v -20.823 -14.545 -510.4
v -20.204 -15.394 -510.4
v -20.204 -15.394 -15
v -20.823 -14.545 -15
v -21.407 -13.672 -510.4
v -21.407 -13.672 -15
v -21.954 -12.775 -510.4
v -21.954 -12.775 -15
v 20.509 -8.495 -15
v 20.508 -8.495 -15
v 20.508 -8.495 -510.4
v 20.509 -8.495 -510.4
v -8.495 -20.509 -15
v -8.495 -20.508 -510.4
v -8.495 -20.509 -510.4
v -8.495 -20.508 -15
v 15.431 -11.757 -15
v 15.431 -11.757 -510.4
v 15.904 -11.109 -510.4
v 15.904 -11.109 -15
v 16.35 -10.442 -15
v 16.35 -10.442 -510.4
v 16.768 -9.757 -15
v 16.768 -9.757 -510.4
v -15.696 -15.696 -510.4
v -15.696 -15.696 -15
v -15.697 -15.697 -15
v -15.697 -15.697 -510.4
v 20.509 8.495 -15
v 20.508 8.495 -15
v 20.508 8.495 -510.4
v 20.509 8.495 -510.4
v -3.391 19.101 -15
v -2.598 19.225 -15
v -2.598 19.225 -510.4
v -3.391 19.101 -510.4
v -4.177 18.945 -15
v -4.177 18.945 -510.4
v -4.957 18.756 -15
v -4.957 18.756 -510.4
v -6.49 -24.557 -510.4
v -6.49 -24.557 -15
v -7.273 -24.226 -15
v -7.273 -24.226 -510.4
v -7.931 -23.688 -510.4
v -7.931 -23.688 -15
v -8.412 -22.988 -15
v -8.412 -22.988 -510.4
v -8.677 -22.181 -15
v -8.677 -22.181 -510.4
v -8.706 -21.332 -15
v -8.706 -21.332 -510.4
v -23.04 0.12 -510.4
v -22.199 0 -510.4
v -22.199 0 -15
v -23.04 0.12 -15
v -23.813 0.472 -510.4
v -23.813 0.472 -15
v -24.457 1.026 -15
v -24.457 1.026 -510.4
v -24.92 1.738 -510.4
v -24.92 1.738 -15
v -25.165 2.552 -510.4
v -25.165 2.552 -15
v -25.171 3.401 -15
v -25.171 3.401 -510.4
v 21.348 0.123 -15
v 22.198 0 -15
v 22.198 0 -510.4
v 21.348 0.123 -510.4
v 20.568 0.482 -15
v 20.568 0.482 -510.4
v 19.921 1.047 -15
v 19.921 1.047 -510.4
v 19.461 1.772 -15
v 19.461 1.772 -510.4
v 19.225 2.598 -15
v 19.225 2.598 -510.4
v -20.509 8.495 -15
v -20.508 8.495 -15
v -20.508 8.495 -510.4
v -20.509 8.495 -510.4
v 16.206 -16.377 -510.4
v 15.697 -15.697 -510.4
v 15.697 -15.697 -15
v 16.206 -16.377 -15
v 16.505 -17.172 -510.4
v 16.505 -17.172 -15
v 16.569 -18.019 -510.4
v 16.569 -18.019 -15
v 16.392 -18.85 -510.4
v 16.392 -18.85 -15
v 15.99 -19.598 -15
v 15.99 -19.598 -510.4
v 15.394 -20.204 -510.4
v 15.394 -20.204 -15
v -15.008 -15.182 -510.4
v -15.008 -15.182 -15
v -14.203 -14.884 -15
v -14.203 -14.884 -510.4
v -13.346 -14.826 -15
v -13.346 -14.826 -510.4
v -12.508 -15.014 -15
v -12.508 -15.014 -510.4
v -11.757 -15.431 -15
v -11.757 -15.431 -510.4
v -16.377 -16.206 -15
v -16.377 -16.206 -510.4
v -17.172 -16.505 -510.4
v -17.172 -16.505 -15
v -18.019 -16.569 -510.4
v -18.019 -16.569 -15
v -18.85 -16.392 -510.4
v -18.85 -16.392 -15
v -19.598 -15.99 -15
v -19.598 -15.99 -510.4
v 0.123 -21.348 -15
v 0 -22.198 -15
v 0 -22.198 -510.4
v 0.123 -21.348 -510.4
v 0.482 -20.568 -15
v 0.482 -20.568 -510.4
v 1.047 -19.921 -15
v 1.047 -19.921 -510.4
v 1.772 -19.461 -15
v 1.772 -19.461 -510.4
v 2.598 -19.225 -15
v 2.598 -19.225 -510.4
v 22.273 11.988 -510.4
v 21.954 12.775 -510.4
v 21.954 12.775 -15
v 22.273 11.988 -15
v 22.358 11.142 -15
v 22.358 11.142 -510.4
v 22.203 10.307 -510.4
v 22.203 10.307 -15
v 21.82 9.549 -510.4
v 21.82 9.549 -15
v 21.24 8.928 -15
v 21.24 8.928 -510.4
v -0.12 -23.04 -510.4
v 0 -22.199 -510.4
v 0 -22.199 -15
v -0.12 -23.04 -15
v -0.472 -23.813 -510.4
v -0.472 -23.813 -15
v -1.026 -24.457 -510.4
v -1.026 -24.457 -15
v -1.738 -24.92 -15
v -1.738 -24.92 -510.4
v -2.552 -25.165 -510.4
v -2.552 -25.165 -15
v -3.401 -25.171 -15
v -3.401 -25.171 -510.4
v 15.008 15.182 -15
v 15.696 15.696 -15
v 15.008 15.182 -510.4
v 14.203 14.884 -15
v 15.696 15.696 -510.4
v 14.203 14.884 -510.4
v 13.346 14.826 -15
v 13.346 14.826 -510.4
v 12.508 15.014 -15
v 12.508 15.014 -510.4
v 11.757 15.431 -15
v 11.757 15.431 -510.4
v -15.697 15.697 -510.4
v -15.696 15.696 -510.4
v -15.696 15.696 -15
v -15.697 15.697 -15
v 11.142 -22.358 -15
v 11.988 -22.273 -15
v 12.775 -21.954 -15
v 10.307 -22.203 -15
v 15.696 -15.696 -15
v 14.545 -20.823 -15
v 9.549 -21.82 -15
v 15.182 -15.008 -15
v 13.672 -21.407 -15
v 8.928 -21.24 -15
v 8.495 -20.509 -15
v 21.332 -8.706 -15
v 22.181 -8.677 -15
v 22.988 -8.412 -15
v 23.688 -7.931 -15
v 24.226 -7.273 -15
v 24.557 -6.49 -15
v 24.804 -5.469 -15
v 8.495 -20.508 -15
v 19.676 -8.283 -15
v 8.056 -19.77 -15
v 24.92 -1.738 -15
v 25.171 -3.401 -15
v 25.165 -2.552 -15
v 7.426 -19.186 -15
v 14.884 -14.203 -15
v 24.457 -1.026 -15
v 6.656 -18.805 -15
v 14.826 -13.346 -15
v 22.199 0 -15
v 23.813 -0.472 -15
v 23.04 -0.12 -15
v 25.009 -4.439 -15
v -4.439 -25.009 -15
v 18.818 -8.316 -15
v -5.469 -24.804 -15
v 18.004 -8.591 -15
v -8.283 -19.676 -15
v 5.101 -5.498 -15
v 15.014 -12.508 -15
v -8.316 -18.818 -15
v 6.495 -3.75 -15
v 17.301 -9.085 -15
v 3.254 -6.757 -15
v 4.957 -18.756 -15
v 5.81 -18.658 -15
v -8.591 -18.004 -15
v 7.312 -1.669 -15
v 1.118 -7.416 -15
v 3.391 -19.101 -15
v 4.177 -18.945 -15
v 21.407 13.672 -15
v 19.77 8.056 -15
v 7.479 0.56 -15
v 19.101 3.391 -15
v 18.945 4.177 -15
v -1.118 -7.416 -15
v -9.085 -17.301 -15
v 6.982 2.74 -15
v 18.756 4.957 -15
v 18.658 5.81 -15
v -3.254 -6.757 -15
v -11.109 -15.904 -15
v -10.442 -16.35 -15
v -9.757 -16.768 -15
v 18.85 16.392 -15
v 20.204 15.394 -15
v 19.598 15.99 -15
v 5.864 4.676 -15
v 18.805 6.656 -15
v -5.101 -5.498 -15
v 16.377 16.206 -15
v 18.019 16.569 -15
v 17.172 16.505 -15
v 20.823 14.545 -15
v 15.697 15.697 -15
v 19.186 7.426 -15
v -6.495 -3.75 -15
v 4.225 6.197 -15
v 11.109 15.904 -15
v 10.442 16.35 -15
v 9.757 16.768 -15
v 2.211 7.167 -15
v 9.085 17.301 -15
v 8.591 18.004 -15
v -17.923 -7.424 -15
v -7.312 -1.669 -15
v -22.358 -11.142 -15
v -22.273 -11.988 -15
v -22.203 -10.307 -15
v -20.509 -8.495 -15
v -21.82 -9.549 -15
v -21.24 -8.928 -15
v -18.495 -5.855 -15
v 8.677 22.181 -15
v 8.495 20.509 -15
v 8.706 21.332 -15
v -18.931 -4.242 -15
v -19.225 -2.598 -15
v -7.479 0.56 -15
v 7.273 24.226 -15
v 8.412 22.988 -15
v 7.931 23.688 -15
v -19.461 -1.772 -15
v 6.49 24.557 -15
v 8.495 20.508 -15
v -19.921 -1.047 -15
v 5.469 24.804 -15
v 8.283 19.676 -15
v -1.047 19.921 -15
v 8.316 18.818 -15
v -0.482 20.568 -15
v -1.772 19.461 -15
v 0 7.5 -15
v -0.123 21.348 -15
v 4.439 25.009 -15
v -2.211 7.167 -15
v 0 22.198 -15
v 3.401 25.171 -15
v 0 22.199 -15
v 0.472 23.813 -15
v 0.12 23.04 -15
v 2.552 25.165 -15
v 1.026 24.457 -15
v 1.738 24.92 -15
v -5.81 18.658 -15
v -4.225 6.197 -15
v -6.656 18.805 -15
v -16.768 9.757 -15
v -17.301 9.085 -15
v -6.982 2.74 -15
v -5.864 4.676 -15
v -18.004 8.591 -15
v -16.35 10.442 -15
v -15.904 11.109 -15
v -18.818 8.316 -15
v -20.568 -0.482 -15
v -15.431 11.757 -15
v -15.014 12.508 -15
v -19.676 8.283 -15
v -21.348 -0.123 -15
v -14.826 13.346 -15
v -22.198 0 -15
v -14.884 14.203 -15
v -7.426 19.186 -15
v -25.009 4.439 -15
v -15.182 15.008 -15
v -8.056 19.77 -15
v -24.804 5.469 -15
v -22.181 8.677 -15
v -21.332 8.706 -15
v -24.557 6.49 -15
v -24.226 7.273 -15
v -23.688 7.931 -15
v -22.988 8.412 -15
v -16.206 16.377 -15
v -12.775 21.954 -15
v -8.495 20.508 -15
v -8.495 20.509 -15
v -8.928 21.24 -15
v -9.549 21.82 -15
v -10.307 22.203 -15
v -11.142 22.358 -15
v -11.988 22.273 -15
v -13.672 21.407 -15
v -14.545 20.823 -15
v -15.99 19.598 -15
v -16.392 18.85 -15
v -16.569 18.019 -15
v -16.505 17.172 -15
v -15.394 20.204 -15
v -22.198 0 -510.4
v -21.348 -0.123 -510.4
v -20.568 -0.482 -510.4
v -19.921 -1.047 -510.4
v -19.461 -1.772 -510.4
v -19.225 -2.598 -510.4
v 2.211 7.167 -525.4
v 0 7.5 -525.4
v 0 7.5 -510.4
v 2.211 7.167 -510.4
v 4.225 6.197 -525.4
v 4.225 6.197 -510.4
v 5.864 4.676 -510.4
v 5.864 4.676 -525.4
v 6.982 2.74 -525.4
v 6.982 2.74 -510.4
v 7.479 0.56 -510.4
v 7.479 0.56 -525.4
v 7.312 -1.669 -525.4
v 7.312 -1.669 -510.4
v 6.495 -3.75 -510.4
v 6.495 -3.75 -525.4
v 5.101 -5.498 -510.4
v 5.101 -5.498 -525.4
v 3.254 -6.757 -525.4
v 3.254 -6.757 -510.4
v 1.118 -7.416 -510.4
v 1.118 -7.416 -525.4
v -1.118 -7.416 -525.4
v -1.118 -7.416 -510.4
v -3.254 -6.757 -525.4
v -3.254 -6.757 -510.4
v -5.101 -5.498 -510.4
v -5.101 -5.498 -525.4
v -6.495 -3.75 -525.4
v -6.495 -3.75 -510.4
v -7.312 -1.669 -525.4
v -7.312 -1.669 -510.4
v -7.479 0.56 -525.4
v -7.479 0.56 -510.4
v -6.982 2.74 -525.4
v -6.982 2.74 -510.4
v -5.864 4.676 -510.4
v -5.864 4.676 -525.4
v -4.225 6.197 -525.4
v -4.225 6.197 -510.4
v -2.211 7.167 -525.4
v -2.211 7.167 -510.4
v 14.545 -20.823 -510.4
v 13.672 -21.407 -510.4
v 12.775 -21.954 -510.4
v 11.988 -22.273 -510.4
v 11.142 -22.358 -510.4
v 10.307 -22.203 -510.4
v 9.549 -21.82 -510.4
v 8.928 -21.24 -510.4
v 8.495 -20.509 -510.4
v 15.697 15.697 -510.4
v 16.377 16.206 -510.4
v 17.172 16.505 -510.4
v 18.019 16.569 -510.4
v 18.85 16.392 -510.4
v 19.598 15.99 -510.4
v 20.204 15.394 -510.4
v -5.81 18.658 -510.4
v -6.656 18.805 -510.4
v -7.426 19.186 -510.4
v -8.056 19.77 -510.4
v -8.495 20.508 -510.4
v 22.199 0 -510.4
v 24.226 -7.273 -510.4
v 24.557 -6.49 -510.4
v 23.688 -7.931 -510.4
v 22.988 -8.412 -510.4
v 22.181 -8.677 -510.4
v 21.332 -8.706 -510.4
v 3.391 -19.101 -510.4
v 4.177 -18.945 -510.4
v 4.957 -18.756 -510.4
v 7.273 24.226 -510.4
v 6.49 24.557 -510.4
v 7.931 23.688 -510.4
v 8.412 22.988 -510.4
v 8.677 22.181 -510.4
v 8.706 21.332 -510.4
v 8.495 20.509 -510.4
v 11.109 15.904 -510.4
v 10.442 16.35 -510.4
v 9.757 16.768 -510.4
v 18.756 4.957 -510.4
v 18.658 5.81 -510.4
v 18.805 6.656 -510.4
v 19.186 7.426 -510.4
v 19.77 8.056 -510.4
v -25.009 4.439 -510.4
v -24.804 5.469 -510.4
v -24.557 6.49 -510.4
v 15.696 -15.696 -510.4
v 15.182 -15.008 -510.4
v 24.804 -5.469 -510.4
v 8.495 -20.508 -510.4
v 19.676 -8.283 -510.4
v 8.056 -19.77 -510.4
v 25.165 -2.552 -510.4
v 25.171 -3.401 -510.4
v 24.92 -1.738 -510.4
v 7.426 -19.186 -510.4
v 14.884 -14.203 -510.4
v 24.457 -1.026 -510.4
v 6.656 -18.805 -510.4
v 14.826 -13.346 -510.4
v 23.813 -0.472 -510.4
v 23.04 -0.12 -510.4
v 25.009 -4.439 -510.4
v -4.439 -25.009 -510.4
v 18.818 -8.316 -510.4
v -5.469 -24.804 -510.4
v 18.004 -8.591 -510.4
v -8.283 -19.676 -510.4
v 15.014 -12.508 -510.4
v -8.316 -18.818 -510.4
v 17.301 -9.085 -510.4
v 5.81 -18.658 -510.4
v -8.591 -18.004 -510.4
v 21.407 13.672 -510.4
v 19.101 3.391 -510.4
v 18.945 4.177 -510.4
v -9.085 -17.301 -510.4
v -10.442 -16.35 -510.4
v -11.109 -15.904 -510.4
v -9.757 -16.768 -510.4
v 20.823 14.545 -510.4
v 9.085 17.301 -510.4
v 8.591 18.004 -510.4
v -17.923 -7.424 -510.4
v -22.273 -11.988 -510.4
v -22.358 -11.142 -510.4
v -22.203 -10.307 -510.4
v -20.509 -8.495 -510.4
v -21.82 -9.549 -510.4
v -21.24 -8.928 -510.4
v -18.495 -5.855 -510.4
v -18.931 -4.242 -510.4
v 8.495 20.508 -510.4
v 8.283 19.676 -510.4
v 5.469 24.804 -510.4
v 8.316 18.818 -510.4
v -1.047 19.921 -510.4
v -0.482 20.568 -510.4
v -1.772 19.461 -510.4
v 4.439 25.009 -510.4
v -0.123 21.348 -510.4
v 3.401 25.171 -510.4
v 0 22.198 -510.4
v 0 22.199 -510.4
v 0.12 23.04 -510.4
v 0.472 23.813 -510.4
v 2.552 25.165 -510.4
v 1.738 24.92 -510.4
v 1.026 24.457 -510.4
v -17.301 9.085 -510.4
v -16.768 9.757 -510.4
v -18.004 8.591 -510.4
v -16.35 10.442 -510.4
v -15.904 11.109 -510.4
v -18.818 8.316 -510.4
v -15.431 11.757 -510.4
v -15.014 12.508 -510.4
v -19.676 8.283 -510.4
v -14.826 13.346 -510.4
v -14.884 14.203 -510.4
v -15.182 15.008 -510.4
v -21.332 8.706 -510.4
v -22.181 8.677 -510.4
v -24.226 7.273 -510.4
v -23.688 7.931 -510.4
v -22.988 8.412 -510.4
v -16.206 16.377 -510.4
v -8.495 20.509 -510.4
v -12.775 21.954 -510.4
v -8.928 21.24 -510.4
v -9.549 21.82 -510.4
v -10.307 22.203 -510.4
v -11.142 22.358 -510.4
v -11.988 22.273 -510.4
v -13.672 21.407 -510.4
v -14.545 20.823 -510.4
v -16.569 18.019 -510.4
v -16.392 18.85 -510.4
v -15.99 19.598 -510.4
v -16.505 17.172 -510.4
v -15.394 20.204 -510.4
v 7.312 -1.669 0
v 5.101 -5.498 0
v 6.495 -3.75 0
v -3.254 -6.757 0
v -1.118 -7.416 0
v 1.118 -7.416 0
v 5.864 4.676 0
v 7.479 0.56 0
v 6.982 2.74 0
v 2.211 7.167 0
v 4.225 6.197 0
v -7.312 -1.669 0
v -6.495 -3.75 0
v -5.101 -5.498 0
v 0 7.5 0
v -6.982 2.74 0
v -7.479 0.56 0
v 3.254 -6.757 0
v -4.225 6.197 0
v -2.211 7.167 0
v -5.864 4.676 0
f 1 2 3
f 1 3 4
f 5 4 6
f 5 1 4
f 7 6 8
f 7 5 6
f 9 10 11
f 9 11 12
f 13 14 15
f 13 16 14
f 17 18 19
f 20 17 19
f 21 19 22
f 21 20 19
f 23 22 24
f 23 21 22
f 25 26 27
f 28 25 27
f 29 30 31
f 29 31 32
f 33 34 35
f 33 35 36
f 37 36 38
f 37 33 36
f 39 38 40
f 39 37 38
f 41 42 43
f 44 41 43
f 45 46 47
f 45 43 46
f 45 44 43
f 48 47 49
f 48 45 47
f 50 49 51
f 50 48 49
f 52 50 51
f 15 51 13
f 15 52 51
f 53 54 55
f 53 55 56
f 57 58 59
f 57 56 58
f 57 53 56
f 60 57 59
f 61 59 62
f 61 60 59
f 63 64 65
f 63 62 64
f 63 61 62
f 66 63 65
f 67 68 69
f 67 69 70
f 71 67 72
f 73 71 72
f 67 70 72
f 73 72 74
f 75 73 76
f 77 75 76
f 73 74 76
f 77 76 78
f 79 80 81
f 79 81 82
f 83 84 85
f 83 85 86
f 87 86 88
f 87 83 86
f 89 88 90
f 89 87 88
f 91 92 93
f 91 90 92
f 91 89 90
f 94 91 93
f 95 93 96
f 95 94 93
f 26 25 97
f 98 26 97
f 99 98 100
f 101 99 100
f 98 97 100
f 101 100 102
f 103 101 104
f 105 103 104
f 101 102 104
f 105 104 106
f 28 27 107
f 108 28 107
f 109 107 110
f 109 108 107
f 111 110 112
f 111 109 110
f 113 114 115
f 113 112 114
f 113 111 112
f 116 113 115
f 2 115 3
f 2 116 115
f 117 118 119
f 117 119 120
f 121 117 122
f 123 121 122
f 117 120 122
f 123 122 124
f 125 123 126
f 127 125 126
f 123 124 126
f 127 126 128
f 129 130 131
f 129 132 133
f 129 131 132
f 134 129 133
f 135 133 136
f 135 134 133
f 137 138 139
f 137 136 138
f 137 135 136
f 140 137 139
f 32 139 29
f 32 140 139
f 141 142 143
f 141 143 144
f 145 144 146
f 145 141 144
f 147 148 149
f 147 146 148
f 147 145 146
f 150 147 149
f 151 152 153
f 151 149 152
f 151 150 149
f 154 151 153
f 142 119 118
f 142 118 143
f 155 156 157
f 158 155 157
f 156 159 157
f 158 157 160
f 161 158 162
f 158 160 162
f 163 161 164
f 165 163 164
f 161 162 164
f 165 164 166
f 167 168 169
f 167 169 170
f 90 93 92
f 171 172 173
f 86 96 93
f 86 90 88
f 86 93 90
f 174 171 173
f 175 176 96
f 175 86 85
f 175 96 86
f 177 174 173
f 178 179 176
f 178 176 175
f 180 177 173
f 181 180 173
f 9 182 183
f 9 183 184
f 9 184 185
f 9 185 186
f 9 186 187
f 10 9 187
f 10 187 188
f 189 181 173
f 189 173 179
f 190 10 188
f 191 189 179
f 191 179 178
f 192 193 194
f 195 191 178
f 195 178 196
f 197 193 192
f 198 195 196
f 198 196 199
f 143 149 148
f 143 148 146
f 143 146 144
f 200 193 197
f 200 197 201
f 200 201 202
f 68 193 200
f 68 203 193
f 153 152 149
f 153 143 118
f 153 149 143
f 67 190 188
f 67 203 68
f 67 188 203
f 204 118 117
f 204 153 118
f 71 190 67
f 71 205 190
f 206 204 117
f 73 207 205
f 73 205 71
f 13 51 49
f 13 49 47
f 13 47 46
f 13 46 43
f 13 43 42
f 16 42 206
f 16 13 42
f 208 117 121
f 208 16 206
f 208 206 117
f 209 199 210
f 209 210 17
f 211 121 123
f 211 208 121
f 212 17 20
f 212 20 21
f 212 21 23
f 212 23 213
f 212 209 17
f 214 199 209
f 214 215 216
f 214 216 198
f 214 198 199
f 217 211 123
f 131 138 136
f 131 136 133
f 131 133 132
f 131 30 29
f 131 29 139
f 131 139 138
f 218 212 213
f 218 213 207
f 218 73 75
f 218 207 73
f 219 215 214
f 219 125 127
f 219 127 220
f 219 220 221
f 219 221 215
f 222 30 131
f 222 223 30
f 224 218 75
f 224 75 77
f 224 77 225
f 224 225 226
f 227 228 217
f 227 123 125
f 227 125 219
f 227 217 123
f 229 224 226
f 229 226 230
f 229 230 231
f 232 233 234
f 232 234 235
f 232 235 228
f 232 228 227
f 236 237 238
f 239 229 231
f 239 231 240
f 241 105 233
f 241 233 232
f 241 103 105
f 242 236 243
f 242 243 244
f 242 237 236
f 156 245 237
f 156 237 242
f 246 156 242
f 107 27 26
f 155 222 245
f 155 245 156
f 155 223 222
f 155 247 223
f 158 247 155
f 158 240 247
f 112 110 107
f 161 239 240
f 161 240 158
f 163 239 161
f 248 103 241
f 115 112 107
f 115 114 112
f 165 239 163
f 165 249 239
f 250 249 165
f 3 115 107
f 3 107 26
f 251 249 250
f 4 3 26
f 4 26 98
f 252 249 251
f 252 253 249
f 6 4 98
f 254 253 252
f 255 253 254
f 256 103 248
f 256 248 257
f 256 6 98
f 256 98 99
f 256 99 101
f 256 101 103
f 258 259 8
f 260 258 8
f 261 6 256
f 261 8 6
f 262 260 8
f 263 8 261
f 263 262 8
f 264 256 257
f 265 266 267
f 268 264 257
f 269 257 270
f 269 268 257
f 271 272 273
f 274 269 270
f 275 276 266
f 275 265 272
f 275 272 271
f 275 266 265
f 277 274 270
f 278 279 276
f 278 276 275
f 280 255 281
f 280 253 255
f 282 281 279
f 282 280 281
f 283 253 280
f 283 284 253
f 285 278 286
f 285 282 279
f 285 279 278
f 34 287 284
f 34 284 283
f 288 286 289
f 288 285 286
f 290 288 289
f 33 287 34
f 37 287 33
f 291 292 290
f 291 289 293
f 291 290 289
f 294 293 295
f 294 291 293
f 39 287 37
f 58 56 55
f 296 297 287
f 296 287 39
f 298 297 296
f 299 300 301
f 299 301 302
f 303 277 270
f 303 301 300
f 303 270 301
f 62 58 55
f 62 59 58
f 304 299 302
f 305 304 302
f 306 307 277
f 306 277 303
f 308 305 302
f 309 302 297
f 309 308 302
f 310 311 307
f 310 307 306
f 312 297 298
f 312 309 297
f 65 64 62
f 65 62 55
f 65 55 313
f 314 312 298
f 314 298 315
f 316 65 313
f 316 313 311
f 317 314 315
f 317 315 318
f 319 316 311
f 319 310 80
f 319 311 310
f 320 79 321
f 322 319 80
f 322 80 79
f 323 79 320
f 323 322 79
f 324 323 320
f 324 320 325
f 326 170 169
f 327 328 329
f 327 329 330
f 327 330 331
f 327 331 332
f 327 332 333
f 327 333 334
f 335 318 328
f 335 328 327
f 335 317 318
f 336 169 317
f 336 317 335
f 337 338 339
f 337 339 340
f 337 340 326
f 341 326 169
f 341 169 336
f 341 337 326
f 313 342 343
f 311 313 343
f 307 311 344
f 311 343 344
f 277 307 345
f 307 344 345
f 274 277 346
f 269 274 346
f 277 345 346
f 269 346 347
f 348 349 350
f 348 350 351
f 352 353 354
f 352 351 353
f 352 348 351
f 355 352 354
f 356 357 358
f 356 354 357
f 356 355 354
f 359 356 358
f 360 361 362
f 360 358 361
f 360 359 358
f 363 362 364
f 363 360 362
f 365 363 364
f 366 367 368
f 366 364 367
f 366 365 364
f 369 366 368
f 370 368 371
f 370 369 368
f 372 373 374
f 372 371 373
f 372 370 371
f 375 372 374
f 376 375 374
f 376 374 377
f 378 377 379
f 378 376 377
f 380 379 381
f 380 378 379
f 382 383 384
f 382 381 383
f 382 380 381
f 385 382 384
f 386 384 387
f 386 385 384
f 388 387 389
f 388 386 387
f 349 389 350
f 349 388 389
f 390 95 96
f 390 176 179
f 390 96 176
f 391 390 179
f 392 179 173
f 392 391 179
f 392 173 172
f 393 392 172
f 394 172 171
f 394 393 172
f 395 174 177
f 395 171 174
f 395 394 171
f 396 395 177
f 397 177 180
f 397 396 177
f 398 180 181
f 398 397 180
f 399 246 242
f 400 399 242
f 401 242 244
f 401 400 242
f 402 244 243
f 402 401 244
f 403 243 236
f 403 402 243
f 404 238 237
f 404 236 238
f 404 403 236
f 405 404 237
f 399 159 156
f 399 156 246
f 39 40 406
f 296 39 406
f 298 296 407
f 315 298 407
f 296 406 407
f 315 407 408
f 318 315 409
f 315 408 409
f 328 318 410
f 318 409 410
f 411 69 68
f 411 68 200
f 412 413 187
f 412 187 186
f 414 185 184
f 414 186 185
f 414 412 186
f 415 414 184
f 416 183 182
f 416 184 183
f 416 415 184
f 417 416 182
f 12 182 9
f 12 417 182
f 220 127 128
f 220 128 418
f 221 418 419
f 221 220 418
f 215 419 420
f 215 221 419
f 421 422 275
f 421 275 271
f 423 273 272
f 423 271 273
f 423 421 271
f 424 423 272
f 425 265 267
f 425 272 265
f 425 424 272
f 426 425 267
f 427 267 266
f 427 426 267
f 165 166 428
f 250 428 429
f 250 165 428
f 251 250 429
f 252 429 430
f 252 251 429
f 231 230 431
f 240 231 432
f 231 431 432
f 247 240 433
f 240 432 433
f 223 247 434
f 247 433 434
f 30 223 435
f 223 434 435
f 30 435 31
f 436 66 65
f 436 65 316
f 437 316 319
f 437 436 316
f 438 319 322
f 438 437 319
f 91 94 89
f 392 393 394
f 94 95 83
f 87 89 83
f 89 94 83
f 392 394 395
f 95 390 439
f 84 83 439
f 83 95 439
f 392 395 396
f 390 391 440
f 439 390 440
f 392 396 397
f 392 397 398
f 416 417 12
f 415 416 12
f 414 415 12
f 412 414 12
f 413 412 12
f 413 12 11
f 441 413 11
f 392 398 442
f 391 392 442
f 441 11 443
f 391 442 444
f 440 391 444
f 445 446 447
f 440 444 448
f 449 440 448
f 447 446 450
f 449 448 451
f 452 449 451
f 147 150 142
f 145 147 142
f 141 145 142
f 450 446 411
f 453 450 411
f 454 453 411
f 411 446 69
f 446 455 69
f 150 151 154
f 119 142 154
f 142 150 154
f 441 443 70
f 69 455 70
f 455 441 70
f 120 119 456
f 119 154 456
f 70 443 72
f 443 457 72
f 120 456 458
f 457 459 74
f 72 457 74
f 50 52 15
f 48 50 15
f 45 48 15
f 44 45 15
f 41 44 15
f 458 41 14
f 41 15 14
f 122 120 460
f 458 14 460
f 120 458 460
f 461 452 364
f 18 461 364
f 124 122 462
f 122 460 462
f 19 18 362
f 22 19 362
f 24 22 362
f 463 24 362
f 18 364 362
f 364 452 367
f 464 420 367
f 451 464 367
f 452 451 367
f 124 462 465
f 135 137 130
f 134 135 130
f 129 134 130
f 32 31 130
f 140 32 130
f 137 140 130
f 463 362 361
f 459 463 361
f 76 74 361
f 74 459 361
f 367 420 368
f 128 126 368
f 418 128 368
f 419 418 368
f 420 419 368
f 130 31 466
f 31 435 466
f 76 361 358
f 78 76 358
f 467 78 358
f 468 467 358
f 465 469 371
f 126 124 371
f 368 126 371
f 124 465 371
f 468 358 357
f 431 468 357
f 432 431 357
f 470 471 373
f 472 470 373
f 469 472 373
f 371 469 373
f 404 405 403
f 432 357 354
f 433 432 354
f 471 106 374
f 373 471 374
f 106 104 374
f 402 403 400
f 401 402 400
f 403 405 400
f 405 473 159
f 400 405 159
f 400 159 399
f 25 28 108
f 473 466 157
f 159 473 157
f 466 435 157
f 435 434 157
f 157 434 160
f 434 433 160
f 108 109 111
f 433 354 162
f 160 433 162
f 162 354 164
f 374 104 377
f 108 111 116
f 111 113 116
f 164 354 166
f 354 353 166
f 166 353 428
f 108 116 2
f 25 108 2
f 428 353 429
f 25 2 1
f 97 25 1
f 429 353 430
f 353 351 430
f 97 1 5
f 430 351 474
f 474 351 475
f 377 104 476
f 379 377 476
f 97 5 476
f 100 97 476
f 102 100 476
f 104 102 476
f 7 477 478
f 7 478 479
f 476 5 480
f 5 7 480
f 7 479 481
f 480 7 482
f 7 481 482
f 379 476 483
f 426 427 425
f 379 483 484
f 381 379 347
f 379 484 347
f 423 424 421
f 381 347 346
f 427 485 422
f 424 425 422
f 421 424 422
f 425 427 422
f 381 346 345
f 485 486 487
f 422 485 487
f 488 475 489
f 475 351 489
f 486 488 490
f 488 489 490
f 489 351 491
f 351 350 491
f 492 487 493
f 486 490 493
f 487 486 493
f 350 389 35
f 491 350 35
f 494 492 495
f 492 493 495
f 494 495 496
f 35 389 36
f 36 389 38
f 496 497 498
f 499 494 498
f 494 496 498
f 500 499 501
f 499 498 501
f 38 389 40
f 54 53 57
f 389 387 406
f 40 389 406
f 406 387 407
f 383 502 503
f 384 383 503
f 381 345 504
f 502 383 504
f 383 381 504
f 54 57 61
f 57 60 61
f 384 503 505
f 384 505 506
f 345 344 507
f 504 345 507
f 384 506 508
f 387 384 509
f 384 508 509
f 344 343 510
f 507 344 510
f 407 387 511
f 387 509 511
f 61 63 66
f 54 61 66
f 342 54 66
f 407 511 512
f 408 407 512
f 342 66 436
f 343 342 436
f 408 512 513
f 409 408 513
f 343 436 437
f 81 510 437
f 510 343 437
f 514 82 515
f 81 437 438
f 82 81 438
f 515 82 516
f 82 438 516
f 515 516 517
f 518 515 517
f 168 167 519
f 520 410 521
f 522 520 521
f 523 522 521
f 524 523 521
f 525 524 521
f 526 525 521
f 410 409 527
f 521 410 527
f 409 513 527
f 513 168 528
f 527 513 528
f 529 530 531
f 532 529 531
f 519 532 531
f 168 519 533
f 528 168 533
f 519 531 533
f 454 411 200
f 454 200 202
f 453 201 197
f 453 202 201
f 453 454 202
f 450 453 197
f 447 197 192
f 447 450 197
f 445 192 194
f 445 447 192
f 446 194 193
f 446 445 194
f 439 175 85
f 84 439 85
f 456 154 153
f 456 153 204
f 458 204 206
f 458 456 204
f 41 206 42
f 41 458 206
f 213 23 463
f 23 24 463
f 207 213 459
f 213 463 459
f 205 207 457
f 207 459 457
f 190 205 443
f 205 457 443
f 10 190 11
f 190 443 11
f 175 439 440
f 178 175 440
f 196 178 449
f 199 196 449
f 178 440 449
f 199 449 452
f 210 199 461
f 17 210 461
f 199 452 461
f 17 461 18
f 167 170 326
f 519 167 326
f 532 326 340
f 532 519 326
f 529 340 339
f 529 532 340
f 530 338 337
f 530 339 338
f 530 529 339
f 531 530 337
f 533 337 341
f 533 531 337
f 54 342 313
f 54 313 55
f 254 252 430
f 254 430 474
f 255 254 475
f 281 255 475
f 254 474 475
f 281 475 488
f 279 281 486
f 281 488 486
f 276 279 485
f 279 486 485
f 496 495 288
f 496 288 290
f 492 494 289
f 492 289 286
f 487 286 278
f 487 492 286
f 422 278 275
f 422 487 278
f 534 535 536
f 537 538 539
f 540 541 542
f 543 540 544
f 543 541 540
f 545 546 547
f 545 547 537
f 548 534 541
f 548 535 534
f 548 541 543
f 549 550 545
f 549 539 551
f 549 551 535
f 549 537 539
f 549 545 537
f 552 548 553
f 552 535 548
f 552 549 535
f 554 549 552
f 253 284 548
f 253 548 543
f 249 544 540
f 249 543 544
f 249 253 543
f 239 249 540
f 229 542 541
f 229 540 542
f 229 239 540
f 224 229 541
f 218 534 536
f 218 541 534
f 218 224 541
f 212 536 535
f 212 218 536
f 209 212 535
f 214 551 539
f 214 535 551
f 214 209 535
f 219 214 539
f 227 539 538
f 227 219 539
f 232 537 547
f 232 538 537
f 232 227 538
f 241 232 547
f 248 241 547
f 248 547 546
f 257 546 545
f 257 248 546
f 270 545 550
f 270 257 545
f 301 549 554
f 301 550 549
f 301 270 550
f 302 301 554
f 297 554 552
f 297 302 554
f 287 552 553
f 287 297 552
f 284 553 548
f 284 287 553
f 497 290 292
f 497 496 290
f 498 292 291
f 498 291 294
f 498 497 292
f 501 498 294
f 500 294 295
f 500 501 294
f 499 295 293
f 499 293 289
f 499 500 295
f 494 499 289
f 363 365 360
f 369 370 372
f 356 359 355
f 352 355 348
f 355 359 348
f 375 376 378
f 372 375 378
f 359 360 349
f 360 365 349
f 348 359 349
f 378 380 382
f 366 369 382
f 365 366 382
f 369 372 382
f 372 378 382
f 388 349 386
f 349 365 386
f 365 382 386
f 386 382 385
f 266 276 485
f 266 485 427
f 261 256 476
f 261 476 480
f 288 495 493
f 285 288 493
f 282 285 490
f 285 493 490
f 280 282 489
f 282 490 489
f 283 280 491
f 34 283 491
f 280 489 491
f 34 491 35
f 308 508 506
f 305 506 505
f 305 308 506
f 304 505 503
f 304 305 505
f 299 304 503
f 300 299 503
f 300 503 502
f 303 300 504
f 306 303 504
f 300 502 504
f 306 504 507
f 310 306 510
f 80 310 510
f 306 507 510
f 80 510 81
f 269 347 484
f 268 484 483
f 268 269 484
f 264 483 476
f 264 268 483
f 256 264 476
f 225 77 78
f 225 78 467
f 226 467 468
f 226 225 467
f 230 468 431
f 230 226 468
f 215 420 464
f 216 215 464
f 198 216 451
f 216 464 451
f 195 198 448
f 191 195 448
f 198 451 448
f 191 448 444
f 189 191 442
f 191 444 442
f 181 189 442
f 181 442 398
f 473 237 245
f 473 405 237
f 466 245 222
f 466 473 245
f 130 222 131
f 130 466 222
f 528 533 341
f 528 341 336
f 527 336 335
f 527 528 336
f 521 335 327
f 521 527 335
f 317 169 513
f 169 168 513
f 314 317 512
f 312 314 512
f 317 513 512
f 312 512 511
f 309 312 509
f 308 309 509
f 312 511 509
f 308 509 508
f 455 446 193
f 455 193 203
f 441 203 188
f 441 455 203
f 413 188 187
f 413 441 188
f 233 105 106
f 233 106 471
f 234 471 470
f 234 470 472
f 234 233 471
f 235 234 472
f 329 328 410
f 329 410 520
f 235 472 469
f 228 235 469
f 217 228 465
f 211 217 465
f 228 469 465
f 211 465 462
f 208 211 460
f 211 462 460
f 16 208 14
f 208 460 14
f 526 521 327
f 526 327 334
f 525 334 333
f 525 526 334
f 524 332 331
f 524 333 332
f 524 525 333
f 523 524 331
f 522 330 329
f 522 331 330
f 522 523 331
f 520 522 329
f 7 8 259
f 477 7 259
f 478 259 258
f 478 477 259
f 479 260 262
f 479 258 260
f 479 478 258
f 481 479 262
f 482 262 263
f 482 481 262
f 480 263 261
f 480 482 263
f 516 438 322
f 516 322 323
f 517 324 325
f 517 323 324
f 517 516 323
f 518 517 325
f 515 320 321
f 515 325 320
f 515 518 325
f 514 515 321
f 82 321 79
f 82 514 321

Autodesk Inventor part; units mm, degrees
ref_plane "YZ Plane" through (0, 0, 0) normal (1, 0, 0) x (0, 1, 0)
ref_plane "XZ Plane" through (0, 0, 0) normal (0, 1, 0) x (-1, 0, 0)
ref_plane "XY Plane" through (0, 0, 0) normal (0, 0, 1) x (1, 0, 0)
sketch "Esboço1" plane through (0, 0, 0) normal (1, 0, 0) x (0, 1, 0)
  line L0 (0, 0) -> (0, -525.4)
  line L1 (0, 0) -> (7.5, 0)
  line L2 (7.5, 0) -> (7.5, -525.4)
  line L3 (7.5, -525.4) -> (0, -525.4)
  line L4 (0, -525.4) -> (0, 0)
  line L5 (7.5, -15) -> (25.4, -15)
  line L6 (25.4, -15) -> (25.4, -510.4)
  line L7 (25.4, -510.4) -> (7.5, -510.4)
  line L8 (7.5, -510.4) -> (7.5, -15)
  point P0 (3.75, 0)
  point P1 (3.75, -525.4)
  point P2 (7.5, -510.4)
  dimension "d0" = 525.4
  dimension "d1" = 7.5
  dimension "d2" = 25.4
  dimension "d3" = 15
  dimension "d4" = 15
revolve "Revolução1" add sketch "Esboço1" angle 360 about axis through (0, 0, -525.4) along (0, 0, 1)
thread "Rosca1" size "M1060x8" class "6g" standard "ANSI Metric M Profile" length 495.4
sketch "Esboço2" plane through (0, 0, -15) normal (0, 0, 1) x (1, 0, 0)
  circle A0 centre (0, 0) radius 7.5 projected
  circle A1 centre (0, 0) radius 25.4 projected
  circle A2 centre (0, 0) radius 7.5 projected
  line L0 (0, 0) -> (0, 25.4)
  line L1 (0, 0) -> (-25.4, 0)
  line L2 (0, 0) -> (0, -25.4)
  line L3 (0, 0) -> (25.4, 0)
  line L4 (0, 0) -> (17.9605, 17.9605)
  line L5 (0, 0) -> (9.7202, 23.4665)
  line L6 (0, 0) -> (23.4665, 9.7202)
  line L7 (0, 0) -> (-17.9605, 17.9605)
  line L8 (0, 0) -> (-9.7202, 23.4665)
  line L9 (0, 0) -> (-23.4665, 9.7202)
  line L10 (0, 0) -> (17.9605, -17.9605)
  line L11 (0, 0) -> (9.7202, -23.4665)
  line L12 (0, 0) -> (23.4665, -9.7202)
  line L13 (0, 0) -> (-9.7202, -23.4665)
  line L14 (0, 0) -> (-17.9605, -17.9605)
  line L15 (0, 0) -> (-23.4665, -9.7202)
  circle A3 centre (0, 0) radius 19.4
  point P0 (-17.9233, 7.4241)
  point P1 (-13.7179, 13.7179)
  point P2 (-17.9233, -7.4241)
  point P3 (-19.4, 0)
  point P4 (-7.4241, -17.9233)
  point P5 (-13.7179, -13.7179)
  point P6 (7.4241, -17.9233)
  point P7 (0, -19.4)
  point P8 (17.9233, -7.4241)
  point P9 (13.7179, -13.7179)
  point P10 (17.9233, 7.4241)
  point P11 (19.4, 0)
  point P12 (7.4241, 17.9233)
  point P13 (13.7179, 13.7179)
  point P14 (-7.4241, 17.9233)
  point P15 (0, 19.4)
  dimension "d8" = 22.5
  dimension "d9" = 22.5
  dimension "d10" = 45
  dimension "d11" = 6
extrude "Extrusão1" cut sketch "Esboço2" against normal up to surface (495.4 mm away) contours A3 L6 A1 L3 | L12 A1 L10 A3 | A3 L5 A1 L4 | A3 L8 A1 L0 | A3 L15 A1 L1 | A3 L11 A1 L2 | A3 L9 A1 L7 | L13 A1 L14 A3
fillet "Arredondamento1" radius 3 31 edges at (7.4241, 17.9233, -262.7) (13.7179, 13.7179, -262.7) (17.9605, 17.9605, -262.7) (9.7202, 23.4665, -262.7) (0, 25.4, -262.7) (0, 19.4, -262.7) (-9.7202, 23.4665, -262.7) (-7.4241, 17.9233, -262.7) (-23.4665, 9.7202, -262.7) (-17.9605, 17.9605, -262.7) (-17.9233, 7.4241, -262.7) (-13.7179, 13.7179, -262.7) (19.4, 0, -262.7) (17.9233, 7.4241, -262.7) (23.4665, 9.7202, -262.7) (25.4, 0, -262.7) (23.4665, -9.7202, -262.7) (17.9233, -7.4241, -262.7) (17.9605, -17.9605, -262.7) (13.7179, -13.7179, -262.7) (7.4241, -17.9233, -262.7) (9.7202, -23.4665, -262.7) (0, -19.4, -262.7) (-9.7202, -23.4665, -262.7) (-7.4241, -17.9233, -262.7) (-13.7179, -13.7179, -262.7) (-23.4665, -9.7202, -262.7) (-17.9605, -17.9605, -262.7) (-19.4, 0, -262.7) (-25.4, 0, -262.7) (0, -25.4, -262.7)
equation "\"d9\" = d8"
properties part number "Coletor - Intake"
